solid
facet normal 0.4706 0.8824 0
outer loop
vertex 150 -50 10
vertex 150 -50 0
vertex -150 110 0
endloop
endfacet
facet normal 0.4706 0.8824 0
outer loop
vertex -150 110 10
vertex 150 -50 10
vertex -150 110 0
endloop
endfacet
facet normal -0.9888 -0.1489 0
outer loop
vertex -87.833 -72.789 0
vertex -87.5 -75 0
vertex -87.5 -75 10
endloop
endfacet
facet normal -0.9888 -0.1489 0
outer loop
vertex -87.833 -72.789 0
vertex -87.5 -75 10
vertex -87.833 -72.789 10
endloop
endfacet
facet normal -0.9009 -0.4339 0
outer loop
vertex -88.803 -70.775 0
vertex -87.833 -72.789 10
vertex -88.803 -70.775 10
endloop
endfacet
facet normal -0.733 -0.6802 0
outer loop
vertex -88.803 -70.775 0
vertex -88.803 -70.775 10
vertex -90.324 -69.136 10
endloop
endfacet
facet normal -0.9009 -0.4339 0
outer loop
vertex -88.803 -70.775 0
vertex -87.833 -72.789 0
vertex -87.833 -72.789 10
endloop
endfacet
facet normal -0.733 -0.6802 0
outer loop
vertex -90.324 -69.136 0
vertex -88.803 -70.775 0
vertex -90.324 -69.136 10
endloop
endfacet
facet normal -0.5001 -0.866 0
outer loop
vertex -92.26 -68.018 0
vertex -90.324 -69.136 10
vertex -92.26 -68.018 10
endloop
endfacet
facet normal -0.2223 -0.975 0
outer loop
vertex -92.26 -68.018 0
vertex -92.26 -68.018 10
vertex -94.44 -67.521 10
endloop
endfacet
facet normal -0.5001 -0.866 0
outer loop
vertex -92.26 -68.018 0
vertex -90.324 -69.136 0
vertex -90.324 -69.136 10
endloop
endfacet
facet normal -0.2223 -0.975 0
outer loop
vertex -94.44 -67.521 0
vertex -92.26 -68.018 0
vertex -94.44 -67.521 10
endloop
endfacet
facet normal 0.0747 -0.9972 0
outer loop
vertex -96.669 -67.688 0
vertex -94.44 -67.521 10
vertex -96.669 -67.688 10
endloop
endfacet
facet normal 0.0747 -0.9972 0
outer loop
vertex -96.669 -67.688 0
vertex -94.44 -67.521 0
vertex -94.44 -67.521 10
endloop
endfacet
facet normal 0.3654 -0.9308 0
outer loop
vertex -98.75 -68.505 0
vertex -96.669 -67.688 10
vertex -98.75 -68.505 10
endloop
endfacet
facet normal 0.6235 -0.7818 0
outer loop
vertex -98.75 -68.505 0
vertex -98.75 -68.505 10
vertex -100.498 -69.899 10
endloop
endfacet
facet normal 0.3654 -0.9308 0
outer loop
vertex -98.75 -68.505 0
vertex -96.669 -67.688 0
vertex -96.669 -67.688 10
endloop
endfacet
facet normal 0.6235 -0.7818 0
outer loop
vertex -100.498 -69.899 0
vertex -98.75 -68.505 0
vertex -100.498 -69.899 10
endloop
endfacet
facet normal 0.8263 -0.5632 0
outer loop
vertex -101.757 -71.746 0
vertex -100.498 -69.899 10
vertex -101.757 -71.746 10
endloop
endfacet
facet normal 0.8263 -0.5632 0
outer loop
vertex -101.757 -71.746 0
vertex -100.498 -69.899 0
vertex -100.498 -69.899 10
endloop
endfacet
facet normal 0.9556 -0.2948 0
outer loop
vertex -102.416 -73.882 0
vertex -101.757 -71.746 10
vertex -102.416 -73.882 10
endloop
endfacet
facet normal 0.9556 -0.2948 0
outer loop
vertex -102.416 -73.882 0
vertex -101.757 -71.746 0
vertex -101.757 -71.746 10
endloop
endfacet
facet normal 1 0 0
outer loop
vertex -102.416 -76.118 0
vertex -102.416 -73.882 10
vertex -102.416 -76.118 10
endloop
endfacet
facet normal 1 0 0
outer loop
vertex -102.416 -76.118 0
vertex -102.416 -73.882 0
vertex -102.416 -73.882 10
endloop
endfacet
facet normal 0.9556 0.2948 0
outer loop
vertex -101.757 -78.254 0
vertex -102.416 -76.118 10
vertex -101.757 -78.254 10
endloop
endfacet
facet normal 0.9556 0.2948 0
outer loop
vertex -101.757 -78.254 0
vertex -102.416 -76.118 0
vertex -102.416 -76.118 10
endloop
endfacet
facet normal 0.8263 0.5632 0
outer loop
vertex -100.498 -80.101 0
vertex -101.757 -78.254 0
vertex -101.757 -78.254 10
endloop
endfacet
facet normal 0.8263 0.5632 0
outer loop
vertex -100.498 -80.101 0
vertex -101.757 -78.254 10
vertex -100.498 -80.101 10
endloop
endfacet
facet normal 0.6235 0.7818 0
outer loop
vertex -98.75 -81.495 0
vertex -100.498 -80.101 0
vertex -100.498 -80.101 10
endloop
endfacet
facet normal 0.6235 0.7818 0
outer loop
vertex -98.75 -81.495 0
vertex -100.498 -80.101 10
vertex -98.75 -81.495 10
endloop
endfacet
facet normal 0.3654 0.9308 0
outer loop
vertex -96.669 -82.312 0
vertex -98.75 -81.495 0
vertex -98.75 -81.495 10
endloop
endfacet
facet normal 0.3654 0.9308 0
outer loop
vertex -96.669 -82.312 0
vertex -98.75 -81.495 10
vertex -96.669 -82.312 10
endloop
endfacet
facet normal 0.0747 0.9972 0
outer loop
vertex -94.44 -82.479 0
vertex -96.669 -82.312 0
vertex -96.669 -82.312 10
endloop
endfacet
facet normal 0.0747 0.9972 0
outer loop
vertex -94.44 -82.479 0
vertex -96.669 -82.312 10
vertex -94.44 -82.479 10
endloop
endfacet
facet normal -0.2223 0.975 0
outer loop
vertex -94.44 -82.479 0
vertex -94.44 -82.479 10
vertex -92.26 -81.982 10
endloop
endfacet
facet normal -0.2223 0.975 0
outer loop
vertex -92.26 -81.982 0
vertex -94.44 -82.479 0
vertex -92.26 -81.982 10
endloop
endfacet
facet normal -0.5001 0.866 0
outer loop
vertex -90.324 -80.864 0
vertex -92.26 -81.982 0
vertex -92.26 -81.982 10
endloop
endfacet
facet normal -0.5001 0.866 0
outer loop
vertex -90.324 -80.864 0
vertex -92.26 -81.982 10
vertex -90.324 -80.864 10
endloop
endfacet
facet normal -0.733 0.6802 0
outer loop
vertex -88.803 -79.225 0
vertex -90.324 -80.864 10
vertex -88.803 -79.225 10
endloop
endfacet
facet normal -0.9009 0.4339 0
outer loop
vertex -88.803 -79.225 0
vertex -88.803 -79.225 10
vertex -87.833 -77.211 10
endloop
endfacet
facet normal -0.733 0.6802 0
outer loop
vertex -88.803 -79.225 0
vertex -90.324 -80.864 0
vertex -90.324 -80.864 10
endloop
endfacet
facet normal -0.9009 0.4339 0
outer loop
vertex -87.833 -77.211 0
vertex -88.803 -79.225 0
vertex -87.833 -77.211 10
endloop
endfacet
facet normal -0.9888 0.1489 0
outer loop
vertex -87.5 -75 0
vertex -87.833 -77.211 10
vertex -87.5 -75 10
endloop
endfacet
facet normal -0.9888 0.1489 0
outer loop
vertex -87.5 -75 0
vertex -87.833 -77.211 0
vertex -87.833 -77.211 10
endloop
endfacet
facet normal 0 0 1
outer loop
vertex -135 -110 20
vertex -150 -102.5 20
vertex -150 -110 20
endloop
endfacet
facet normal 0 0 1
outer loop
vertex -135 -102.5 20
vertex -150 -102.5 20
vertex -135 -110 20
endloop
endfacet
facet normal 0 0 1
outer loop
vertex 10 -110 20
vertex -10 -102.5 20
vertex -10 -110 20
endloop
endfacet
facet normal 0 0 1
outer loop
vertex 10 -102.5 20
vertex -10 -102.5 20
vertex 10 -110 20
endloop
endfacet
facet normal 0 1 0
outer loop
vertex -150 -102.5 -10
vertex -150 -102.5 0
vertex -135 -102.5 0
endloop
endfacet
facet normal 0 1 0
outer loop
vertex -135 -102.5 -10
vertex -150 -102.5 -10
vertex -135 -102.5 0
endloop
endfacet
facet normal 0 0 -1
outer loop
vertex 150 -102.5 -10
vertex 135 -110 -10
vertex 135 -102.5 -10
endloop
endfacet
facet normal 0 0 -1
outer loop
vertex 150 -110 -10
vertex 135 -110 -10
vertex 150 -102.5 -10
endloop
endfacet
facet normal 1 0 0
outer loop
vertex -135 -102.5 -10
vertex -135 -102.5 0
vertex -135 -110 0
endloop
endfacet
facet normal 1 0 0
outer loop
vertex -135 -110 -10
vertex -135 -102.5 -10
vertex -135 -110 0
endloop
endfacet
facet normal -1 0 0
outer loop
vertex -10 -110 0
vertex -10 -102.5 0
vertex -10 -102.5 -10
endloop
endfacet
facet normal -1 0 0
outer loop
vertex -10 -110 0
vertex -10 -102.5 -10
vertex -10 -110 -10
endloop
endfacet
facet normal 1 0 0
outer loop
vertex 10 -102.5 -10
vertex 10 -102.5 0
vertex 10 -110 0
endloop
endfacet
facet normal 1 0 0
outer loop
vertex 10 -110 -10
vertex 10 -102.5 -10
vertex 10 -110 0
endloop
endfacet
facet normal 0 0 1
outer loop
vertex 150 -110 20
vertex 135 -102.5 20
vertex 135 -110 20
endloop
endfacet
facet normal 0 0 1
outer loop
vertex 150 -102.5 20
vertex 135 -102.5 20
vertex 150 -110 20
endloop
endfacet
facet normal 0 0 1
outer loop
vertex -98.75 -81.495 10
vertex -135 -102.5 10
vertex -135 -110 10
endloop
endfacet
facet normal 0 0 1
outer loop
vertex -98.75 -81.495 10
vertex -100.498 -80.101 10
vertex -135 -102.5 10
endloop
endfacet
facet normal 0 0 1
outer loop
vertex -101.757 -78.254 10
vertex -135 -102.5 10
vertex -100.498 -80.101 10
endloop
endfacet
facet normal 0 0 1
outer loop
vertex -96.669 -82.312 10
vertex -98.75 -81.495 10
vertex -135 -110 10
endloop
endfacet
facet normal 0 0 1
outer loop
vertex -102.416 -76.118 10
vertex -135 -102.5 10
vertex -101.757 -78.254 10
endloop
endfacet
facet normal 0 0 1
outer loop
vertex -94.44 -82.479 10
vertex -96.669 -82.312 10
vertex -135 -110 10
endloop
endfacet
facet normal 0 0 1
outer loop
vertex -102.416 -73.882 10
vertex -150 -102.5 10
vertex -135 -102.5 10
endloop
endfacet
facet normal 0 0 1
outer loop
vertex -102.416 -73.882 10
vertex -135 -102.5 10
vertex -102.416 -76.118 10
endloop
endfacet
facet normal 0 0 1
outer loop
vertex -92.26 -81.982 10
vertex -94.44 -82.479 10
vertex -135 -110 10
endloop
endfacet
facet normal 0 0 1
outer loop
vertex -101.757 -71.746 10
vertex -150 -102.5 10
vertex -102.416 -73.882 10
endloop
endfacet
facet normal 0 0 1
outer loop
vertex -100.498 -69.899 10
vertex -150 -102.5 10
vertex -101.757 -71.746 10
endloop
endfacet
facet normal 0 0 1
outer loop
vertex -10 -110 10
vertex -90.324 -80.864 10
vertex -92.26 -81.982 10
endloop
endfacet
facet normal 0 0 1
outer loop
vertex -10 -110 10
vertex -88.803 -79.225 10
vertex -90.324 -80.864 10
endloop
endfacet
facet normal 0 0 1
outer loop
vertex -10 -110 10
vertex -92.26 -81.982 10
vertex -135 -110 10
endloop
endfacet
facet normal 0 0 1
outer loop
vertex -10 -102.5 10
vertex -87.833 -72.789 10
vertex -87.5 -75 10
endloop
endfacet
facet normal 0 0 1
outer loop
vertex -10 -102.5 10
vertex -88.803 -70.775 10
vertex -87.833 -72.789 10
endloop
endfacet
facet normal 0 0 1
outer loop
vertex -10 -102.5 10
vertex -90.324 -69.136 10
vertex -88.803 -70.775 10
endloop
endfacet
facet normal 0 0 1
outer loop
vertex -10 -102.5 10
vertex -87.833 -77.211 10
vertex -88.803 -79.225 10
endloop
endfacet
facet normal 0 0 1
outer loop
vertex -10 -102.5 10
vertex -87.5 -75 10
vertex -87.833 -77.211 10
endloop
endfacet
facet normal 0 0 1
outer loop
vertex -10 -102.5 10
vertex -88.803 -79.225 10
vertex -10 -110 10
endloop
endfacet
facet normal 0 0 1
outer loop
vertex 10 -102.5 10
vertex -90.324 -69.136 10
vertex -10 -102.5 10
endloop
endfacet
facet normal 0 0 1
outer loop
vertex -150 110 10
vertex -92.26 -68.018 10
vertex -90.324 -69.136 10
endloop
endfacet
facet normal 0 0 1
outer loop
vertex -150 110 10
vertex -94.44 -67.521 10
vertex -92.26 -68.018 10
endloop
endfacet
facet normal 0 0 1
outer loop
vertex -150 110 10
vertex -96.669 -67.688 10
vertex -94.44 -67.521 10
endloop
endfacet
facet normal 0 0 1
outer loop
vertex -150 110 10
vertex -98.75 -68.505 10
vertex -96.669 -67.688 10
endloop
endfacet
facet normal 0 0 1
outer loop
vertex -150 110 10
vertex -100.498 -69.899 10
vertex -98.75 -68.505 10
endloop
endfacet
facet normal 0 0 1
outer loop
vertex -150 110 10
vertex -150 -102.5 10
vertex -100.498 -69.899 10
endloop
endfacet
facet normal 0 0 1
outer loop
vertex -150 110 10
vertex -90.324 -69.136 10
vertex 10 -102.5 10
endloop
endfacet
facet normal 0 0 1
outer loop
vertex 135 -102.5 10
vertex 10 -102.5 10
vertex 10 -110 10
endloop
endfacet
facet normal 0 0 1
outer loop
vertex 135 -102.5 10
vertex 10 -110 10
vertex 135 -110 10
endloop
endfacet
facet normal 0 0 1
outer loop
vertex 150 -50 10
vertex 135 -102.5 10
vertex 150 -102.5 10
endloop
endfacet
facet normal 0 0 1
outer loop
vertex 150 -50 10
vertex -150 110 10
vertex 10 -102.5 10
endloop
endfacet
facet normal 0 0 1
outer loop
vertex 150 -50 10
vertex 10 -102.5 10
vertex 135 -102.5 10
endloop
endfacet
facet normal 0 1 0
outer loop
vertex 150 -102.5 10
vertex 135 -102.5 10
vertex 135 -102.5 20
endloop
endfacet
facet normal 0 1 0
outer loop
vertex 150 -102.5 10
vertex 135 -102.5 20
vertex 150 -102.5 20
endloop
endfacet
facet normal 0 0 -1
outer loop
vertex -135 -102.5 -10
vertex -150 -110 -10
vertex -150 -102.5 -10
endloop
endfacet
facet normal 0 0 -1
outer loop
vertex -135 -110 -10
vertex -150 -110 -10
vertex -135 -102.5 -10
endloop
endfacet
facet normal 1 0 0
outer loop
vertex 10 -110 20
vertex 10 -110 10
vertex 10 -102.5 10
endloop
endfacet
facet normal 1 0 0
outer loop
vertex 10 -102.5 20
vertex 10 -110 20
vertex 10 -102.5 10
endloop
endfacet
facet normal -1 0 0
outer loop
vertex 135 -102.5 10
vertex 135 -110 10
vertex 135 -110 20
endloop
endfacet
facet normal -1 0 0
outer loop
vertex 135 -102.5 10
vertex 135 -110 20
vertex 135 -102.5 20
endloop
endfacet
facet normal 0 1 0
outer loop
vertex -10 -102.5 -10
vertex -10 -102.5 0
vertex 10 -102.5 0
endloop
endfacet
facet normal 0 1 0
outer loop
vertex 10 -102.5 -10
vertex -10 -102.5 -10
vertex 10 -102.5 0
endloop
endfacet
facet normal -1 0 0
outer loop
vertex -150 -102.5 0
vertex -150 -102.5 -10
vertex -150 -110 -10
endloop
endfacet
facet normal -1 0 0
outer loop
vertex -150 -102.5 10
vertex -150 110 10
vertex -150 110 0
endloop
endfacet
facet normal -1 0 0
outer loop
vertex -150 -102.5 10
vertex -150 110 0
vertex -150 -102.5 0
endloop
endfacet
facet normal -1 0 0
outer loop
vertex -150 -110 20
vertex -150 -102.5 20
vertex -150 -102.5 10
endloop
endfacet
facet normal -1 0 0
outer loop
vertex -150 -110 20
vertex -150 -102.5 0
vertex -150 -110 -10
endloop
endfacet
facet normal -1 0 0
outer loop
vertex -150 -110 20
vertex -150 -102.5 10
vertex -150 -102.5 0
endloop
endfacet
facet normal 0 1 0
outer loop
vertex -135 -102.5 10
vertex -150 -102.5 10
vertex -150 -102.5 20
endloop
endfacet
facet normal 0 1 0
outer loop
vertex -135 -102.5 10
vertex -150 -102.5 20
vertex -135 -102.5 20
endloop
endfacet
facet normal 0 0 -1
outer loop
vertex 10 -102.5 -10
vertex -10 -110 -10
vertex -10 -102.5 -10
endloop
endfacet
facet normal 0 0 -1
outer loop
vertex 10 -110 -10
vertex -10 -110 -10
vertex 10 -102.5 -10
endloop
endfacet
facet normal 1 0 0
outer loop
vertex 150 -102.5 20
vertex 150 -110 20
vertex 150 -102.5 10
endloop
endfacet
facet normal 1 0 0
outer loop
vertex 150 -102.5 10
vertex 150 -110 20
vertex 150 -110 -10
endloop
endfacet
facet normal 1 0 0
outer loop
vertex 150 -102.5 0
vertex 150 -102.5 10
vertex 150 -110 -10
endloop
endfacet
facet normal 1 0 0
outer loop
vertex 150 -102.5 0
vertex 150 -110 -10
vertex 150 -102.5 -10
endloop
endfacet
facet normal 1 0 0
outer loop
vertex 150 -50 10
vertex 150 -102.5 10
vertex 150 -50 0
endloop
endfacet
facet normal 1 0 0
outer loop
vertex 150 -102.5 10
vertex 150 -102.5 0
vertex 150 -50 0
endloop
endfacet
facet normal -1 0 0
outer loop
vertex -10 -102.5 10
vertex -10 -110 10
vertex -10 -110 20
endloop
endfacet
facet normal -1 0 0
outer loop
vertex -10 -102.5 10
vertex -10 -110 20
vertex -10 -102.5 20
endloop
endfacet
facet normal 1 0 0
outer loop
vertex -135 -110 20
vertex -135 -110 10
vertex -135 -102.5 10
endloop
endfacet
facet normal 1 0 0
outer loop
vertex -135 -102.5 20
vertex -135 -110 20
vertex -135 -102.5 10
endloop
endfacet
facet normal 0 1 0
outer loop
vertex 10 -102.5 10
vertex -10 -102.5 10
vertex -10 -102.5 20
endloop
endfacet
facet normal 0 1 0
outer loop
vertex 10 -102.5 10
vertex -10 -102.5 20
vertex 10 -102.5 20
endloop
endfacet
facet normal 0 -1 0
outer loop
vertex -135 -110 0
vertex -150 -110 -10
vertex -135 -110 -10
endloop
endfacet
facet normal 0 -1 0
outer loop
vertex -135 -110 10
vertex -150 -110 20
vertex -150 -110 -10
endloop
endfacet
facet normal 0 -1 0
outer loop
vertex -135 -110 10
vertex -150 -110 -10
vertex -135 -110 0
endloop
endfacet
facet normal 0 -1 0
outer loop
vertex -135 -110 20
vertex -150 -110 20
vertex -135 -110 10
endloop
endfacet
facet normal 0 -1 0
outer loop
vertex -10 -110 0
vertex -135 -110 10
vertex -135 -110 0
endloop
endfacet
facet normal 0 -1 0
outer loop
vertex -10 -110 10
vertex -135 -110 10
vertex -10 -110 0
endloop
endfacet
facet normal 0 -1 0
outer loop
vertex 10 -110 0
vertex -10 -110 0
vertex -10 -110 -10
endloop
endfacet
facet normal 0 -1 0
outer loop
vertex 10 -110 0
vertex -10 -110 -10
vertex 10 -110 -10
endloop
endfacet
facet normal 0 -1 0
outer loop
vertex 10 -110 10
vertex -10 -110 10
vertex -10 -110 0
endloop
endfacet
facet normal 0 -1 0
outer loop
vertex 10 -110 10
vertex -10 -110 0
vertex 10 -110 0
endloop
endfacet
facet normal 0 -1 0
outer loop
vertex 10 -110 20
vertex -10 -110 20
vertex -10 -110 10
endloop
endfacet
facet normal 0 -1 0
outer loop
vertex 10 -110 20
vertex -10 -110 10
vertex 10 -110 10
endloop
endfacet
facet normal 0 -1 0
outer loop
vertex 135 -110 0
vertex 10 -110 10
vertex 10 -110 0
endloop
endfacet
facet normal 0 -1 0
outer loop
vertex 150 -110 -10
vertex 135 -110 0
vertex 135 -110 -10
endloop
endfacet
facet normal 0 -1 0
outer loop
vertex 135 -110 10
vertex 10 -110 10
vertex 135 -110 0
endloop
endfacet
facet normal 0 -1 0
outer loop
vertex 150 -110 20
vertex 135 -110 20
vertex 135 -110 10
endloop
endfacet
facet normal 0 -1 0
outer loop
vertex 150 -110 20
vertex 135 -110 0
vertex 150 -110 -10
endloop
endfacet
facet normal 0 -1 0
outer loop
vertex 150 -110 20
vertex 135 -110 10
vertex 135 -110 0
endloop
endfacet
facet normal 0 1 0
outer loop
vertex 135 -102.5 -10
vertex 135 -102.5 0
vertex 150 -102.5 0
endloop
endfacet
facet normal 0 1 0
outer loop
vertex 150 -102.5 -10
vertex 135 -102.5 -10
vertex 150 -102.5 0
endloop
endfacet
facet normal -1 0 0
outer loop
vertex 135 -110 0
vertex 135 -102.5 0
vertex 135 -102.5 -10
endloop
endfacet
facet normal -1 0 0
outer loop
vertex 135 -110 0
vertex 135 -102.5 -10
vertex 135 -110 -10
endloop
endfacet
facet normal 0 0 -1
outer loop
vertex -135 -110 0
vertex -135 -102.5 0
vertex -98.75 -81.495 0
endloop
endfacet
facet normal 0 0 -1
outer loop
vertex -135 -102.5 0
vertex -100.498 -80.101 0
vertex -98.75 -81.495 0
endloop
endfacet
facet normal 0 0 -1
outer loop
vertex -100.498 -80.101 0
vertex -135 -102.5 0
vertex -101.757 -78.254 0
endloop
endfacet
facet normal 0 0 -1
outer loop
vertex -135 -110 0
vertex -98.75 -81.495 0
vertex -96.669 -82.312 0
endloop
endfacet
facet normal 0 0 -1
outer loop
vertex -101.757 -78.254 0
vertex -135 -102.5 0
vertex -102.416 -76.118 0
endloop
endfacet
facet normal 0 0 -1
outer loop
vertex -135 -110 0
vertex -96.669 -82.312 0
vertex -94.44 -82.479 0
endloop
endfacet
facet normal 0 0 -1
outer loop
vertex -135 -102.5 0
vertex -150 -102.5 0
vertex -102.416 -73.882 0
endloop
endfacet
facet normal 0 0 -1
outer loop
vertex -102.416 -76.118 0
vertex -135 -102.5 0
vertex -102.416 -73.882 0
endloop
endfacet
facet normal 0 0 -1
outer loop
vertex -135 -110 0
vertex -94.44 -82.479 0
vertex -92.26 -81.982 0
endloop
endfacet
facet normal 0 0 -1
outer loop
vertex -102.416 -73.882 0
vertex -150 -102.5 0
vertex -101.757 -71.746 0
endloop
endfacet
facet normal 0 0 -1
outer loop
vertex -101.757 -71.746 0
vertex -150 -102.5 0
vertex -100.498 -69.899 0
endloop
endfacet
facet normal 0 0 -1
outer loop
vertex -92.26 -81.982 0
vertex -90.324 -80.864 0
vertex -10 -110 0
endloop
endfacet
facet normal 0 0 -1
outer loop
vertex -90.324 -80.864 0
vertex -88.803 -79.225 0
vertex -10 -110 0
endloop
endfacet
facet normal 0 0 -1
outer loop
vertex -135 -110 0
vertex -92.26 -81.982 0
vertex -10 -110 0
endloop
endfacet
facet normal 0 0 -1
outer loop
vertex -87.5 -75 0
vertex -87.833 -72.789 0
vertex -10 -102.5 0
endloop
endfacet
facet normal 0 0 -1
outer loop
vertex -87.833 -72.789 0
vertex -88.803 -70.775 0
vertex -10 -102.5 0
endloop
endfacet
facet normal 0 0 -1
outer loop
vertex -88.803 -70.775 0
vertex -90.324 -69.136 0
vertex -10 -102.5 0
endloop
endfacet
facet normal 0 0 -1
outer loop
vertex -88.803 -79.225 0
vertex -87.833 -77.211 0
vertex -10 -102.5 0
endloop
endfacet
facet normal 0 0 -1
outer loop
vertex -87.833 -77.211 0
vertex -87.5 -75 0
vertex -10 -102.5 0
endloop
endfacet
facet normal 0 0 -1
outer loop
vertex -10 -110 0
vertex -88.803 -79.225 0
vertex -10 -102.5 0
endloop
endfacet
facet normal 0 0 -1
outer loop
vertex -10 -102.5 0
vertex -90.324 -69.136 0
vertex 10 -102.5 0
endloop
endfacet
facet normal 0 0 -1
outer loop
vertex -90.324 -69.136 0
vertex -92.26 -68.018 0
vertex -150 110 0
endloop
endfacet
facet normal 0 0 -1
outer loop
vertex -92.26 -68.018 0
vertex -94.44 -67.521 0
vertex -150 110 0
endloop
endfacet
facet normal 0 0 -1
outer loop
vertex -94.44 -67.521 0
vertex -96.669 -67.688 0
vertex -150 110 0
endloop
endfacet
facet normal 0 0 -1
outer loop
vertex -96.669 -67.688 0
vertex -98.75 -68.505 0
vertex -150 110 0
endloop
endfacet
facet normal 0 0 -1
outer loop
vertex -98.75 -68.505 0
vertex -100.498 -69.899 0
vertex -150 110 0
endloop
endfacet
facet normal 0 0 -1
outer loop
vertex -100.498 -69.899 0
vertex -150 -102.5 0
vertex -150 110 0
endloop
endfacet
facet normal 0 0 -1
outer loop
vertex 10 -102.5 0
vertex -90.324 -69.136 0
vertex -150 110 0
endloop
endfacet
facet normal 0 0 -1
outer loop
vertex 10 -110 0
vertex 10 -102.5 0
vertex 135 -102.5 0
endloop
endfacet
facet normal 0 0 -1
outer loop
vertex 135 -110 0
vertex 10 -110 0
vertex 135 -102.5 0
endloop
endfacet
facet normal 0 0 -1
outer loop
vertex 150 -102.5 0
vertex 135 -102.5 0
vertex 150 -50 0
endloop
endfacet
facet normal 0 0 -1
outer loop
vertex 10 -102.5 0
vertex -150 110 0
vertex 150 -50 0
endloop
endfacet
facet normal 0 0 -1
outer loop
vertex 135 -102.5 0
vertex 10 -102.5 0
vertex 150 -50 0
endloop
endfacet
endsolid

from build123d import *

# Parameters (mm, degrees)
F0_R     = 7.5
F1_DEPTH = 10
F2_W     = 15
F2_H     = 7.5
F2_W_2   = 20
F3_DEPTH = 10
F4_W     = 15
F4_H     = 7.5
F4_W_2   = 20
F5_DEPTH = 10


with BuildPart() as f1:
    # F0 (on Top) → F1 (new body)
    with BuildSketch(Plane.XY):
        Polygon((150, -50), (-150, 110), (-150, -110), (150, -110), align=None)
        with Locations((-95, -75)):
            Circle(F0_R, mode=Mode.SUBTRACT)
    extrude(amount=F1_DEPTH)

    # F2 (on face) → F3 (join)
    with BuildSketch(Plane.XY.offset(10)):
        with Locations((-142.5, -106.25)):
            Rectangle(F2_W, F2_H)
        with Locations((142.5, -106.25)):
            Rectangle(F2_W, F2_H)
        with Locations((0, -106.25)):
            Rectangle(F2_W_2, F2_H)
    extrude(amount=F3_DEPTH)

    # F4 (on face) → F5 (join)
    with BuildSketch(Plane(origin=(0, 0, 0), x_dir=(1, 0, 0), z_dir=(0, 0, -1))):
        with Locations((-142.5, 106.25)):
            Rectangle(F4_W, F4_H)
        with Locations((142.5, 106.25)):
            Rectangle(F4_W, F4_H)
        with Locations((0, 106.25)):
            Rectangle(F4_W_2, F4_H)
    extrude(amount=F5_DEPTH)


solid = f1.part
